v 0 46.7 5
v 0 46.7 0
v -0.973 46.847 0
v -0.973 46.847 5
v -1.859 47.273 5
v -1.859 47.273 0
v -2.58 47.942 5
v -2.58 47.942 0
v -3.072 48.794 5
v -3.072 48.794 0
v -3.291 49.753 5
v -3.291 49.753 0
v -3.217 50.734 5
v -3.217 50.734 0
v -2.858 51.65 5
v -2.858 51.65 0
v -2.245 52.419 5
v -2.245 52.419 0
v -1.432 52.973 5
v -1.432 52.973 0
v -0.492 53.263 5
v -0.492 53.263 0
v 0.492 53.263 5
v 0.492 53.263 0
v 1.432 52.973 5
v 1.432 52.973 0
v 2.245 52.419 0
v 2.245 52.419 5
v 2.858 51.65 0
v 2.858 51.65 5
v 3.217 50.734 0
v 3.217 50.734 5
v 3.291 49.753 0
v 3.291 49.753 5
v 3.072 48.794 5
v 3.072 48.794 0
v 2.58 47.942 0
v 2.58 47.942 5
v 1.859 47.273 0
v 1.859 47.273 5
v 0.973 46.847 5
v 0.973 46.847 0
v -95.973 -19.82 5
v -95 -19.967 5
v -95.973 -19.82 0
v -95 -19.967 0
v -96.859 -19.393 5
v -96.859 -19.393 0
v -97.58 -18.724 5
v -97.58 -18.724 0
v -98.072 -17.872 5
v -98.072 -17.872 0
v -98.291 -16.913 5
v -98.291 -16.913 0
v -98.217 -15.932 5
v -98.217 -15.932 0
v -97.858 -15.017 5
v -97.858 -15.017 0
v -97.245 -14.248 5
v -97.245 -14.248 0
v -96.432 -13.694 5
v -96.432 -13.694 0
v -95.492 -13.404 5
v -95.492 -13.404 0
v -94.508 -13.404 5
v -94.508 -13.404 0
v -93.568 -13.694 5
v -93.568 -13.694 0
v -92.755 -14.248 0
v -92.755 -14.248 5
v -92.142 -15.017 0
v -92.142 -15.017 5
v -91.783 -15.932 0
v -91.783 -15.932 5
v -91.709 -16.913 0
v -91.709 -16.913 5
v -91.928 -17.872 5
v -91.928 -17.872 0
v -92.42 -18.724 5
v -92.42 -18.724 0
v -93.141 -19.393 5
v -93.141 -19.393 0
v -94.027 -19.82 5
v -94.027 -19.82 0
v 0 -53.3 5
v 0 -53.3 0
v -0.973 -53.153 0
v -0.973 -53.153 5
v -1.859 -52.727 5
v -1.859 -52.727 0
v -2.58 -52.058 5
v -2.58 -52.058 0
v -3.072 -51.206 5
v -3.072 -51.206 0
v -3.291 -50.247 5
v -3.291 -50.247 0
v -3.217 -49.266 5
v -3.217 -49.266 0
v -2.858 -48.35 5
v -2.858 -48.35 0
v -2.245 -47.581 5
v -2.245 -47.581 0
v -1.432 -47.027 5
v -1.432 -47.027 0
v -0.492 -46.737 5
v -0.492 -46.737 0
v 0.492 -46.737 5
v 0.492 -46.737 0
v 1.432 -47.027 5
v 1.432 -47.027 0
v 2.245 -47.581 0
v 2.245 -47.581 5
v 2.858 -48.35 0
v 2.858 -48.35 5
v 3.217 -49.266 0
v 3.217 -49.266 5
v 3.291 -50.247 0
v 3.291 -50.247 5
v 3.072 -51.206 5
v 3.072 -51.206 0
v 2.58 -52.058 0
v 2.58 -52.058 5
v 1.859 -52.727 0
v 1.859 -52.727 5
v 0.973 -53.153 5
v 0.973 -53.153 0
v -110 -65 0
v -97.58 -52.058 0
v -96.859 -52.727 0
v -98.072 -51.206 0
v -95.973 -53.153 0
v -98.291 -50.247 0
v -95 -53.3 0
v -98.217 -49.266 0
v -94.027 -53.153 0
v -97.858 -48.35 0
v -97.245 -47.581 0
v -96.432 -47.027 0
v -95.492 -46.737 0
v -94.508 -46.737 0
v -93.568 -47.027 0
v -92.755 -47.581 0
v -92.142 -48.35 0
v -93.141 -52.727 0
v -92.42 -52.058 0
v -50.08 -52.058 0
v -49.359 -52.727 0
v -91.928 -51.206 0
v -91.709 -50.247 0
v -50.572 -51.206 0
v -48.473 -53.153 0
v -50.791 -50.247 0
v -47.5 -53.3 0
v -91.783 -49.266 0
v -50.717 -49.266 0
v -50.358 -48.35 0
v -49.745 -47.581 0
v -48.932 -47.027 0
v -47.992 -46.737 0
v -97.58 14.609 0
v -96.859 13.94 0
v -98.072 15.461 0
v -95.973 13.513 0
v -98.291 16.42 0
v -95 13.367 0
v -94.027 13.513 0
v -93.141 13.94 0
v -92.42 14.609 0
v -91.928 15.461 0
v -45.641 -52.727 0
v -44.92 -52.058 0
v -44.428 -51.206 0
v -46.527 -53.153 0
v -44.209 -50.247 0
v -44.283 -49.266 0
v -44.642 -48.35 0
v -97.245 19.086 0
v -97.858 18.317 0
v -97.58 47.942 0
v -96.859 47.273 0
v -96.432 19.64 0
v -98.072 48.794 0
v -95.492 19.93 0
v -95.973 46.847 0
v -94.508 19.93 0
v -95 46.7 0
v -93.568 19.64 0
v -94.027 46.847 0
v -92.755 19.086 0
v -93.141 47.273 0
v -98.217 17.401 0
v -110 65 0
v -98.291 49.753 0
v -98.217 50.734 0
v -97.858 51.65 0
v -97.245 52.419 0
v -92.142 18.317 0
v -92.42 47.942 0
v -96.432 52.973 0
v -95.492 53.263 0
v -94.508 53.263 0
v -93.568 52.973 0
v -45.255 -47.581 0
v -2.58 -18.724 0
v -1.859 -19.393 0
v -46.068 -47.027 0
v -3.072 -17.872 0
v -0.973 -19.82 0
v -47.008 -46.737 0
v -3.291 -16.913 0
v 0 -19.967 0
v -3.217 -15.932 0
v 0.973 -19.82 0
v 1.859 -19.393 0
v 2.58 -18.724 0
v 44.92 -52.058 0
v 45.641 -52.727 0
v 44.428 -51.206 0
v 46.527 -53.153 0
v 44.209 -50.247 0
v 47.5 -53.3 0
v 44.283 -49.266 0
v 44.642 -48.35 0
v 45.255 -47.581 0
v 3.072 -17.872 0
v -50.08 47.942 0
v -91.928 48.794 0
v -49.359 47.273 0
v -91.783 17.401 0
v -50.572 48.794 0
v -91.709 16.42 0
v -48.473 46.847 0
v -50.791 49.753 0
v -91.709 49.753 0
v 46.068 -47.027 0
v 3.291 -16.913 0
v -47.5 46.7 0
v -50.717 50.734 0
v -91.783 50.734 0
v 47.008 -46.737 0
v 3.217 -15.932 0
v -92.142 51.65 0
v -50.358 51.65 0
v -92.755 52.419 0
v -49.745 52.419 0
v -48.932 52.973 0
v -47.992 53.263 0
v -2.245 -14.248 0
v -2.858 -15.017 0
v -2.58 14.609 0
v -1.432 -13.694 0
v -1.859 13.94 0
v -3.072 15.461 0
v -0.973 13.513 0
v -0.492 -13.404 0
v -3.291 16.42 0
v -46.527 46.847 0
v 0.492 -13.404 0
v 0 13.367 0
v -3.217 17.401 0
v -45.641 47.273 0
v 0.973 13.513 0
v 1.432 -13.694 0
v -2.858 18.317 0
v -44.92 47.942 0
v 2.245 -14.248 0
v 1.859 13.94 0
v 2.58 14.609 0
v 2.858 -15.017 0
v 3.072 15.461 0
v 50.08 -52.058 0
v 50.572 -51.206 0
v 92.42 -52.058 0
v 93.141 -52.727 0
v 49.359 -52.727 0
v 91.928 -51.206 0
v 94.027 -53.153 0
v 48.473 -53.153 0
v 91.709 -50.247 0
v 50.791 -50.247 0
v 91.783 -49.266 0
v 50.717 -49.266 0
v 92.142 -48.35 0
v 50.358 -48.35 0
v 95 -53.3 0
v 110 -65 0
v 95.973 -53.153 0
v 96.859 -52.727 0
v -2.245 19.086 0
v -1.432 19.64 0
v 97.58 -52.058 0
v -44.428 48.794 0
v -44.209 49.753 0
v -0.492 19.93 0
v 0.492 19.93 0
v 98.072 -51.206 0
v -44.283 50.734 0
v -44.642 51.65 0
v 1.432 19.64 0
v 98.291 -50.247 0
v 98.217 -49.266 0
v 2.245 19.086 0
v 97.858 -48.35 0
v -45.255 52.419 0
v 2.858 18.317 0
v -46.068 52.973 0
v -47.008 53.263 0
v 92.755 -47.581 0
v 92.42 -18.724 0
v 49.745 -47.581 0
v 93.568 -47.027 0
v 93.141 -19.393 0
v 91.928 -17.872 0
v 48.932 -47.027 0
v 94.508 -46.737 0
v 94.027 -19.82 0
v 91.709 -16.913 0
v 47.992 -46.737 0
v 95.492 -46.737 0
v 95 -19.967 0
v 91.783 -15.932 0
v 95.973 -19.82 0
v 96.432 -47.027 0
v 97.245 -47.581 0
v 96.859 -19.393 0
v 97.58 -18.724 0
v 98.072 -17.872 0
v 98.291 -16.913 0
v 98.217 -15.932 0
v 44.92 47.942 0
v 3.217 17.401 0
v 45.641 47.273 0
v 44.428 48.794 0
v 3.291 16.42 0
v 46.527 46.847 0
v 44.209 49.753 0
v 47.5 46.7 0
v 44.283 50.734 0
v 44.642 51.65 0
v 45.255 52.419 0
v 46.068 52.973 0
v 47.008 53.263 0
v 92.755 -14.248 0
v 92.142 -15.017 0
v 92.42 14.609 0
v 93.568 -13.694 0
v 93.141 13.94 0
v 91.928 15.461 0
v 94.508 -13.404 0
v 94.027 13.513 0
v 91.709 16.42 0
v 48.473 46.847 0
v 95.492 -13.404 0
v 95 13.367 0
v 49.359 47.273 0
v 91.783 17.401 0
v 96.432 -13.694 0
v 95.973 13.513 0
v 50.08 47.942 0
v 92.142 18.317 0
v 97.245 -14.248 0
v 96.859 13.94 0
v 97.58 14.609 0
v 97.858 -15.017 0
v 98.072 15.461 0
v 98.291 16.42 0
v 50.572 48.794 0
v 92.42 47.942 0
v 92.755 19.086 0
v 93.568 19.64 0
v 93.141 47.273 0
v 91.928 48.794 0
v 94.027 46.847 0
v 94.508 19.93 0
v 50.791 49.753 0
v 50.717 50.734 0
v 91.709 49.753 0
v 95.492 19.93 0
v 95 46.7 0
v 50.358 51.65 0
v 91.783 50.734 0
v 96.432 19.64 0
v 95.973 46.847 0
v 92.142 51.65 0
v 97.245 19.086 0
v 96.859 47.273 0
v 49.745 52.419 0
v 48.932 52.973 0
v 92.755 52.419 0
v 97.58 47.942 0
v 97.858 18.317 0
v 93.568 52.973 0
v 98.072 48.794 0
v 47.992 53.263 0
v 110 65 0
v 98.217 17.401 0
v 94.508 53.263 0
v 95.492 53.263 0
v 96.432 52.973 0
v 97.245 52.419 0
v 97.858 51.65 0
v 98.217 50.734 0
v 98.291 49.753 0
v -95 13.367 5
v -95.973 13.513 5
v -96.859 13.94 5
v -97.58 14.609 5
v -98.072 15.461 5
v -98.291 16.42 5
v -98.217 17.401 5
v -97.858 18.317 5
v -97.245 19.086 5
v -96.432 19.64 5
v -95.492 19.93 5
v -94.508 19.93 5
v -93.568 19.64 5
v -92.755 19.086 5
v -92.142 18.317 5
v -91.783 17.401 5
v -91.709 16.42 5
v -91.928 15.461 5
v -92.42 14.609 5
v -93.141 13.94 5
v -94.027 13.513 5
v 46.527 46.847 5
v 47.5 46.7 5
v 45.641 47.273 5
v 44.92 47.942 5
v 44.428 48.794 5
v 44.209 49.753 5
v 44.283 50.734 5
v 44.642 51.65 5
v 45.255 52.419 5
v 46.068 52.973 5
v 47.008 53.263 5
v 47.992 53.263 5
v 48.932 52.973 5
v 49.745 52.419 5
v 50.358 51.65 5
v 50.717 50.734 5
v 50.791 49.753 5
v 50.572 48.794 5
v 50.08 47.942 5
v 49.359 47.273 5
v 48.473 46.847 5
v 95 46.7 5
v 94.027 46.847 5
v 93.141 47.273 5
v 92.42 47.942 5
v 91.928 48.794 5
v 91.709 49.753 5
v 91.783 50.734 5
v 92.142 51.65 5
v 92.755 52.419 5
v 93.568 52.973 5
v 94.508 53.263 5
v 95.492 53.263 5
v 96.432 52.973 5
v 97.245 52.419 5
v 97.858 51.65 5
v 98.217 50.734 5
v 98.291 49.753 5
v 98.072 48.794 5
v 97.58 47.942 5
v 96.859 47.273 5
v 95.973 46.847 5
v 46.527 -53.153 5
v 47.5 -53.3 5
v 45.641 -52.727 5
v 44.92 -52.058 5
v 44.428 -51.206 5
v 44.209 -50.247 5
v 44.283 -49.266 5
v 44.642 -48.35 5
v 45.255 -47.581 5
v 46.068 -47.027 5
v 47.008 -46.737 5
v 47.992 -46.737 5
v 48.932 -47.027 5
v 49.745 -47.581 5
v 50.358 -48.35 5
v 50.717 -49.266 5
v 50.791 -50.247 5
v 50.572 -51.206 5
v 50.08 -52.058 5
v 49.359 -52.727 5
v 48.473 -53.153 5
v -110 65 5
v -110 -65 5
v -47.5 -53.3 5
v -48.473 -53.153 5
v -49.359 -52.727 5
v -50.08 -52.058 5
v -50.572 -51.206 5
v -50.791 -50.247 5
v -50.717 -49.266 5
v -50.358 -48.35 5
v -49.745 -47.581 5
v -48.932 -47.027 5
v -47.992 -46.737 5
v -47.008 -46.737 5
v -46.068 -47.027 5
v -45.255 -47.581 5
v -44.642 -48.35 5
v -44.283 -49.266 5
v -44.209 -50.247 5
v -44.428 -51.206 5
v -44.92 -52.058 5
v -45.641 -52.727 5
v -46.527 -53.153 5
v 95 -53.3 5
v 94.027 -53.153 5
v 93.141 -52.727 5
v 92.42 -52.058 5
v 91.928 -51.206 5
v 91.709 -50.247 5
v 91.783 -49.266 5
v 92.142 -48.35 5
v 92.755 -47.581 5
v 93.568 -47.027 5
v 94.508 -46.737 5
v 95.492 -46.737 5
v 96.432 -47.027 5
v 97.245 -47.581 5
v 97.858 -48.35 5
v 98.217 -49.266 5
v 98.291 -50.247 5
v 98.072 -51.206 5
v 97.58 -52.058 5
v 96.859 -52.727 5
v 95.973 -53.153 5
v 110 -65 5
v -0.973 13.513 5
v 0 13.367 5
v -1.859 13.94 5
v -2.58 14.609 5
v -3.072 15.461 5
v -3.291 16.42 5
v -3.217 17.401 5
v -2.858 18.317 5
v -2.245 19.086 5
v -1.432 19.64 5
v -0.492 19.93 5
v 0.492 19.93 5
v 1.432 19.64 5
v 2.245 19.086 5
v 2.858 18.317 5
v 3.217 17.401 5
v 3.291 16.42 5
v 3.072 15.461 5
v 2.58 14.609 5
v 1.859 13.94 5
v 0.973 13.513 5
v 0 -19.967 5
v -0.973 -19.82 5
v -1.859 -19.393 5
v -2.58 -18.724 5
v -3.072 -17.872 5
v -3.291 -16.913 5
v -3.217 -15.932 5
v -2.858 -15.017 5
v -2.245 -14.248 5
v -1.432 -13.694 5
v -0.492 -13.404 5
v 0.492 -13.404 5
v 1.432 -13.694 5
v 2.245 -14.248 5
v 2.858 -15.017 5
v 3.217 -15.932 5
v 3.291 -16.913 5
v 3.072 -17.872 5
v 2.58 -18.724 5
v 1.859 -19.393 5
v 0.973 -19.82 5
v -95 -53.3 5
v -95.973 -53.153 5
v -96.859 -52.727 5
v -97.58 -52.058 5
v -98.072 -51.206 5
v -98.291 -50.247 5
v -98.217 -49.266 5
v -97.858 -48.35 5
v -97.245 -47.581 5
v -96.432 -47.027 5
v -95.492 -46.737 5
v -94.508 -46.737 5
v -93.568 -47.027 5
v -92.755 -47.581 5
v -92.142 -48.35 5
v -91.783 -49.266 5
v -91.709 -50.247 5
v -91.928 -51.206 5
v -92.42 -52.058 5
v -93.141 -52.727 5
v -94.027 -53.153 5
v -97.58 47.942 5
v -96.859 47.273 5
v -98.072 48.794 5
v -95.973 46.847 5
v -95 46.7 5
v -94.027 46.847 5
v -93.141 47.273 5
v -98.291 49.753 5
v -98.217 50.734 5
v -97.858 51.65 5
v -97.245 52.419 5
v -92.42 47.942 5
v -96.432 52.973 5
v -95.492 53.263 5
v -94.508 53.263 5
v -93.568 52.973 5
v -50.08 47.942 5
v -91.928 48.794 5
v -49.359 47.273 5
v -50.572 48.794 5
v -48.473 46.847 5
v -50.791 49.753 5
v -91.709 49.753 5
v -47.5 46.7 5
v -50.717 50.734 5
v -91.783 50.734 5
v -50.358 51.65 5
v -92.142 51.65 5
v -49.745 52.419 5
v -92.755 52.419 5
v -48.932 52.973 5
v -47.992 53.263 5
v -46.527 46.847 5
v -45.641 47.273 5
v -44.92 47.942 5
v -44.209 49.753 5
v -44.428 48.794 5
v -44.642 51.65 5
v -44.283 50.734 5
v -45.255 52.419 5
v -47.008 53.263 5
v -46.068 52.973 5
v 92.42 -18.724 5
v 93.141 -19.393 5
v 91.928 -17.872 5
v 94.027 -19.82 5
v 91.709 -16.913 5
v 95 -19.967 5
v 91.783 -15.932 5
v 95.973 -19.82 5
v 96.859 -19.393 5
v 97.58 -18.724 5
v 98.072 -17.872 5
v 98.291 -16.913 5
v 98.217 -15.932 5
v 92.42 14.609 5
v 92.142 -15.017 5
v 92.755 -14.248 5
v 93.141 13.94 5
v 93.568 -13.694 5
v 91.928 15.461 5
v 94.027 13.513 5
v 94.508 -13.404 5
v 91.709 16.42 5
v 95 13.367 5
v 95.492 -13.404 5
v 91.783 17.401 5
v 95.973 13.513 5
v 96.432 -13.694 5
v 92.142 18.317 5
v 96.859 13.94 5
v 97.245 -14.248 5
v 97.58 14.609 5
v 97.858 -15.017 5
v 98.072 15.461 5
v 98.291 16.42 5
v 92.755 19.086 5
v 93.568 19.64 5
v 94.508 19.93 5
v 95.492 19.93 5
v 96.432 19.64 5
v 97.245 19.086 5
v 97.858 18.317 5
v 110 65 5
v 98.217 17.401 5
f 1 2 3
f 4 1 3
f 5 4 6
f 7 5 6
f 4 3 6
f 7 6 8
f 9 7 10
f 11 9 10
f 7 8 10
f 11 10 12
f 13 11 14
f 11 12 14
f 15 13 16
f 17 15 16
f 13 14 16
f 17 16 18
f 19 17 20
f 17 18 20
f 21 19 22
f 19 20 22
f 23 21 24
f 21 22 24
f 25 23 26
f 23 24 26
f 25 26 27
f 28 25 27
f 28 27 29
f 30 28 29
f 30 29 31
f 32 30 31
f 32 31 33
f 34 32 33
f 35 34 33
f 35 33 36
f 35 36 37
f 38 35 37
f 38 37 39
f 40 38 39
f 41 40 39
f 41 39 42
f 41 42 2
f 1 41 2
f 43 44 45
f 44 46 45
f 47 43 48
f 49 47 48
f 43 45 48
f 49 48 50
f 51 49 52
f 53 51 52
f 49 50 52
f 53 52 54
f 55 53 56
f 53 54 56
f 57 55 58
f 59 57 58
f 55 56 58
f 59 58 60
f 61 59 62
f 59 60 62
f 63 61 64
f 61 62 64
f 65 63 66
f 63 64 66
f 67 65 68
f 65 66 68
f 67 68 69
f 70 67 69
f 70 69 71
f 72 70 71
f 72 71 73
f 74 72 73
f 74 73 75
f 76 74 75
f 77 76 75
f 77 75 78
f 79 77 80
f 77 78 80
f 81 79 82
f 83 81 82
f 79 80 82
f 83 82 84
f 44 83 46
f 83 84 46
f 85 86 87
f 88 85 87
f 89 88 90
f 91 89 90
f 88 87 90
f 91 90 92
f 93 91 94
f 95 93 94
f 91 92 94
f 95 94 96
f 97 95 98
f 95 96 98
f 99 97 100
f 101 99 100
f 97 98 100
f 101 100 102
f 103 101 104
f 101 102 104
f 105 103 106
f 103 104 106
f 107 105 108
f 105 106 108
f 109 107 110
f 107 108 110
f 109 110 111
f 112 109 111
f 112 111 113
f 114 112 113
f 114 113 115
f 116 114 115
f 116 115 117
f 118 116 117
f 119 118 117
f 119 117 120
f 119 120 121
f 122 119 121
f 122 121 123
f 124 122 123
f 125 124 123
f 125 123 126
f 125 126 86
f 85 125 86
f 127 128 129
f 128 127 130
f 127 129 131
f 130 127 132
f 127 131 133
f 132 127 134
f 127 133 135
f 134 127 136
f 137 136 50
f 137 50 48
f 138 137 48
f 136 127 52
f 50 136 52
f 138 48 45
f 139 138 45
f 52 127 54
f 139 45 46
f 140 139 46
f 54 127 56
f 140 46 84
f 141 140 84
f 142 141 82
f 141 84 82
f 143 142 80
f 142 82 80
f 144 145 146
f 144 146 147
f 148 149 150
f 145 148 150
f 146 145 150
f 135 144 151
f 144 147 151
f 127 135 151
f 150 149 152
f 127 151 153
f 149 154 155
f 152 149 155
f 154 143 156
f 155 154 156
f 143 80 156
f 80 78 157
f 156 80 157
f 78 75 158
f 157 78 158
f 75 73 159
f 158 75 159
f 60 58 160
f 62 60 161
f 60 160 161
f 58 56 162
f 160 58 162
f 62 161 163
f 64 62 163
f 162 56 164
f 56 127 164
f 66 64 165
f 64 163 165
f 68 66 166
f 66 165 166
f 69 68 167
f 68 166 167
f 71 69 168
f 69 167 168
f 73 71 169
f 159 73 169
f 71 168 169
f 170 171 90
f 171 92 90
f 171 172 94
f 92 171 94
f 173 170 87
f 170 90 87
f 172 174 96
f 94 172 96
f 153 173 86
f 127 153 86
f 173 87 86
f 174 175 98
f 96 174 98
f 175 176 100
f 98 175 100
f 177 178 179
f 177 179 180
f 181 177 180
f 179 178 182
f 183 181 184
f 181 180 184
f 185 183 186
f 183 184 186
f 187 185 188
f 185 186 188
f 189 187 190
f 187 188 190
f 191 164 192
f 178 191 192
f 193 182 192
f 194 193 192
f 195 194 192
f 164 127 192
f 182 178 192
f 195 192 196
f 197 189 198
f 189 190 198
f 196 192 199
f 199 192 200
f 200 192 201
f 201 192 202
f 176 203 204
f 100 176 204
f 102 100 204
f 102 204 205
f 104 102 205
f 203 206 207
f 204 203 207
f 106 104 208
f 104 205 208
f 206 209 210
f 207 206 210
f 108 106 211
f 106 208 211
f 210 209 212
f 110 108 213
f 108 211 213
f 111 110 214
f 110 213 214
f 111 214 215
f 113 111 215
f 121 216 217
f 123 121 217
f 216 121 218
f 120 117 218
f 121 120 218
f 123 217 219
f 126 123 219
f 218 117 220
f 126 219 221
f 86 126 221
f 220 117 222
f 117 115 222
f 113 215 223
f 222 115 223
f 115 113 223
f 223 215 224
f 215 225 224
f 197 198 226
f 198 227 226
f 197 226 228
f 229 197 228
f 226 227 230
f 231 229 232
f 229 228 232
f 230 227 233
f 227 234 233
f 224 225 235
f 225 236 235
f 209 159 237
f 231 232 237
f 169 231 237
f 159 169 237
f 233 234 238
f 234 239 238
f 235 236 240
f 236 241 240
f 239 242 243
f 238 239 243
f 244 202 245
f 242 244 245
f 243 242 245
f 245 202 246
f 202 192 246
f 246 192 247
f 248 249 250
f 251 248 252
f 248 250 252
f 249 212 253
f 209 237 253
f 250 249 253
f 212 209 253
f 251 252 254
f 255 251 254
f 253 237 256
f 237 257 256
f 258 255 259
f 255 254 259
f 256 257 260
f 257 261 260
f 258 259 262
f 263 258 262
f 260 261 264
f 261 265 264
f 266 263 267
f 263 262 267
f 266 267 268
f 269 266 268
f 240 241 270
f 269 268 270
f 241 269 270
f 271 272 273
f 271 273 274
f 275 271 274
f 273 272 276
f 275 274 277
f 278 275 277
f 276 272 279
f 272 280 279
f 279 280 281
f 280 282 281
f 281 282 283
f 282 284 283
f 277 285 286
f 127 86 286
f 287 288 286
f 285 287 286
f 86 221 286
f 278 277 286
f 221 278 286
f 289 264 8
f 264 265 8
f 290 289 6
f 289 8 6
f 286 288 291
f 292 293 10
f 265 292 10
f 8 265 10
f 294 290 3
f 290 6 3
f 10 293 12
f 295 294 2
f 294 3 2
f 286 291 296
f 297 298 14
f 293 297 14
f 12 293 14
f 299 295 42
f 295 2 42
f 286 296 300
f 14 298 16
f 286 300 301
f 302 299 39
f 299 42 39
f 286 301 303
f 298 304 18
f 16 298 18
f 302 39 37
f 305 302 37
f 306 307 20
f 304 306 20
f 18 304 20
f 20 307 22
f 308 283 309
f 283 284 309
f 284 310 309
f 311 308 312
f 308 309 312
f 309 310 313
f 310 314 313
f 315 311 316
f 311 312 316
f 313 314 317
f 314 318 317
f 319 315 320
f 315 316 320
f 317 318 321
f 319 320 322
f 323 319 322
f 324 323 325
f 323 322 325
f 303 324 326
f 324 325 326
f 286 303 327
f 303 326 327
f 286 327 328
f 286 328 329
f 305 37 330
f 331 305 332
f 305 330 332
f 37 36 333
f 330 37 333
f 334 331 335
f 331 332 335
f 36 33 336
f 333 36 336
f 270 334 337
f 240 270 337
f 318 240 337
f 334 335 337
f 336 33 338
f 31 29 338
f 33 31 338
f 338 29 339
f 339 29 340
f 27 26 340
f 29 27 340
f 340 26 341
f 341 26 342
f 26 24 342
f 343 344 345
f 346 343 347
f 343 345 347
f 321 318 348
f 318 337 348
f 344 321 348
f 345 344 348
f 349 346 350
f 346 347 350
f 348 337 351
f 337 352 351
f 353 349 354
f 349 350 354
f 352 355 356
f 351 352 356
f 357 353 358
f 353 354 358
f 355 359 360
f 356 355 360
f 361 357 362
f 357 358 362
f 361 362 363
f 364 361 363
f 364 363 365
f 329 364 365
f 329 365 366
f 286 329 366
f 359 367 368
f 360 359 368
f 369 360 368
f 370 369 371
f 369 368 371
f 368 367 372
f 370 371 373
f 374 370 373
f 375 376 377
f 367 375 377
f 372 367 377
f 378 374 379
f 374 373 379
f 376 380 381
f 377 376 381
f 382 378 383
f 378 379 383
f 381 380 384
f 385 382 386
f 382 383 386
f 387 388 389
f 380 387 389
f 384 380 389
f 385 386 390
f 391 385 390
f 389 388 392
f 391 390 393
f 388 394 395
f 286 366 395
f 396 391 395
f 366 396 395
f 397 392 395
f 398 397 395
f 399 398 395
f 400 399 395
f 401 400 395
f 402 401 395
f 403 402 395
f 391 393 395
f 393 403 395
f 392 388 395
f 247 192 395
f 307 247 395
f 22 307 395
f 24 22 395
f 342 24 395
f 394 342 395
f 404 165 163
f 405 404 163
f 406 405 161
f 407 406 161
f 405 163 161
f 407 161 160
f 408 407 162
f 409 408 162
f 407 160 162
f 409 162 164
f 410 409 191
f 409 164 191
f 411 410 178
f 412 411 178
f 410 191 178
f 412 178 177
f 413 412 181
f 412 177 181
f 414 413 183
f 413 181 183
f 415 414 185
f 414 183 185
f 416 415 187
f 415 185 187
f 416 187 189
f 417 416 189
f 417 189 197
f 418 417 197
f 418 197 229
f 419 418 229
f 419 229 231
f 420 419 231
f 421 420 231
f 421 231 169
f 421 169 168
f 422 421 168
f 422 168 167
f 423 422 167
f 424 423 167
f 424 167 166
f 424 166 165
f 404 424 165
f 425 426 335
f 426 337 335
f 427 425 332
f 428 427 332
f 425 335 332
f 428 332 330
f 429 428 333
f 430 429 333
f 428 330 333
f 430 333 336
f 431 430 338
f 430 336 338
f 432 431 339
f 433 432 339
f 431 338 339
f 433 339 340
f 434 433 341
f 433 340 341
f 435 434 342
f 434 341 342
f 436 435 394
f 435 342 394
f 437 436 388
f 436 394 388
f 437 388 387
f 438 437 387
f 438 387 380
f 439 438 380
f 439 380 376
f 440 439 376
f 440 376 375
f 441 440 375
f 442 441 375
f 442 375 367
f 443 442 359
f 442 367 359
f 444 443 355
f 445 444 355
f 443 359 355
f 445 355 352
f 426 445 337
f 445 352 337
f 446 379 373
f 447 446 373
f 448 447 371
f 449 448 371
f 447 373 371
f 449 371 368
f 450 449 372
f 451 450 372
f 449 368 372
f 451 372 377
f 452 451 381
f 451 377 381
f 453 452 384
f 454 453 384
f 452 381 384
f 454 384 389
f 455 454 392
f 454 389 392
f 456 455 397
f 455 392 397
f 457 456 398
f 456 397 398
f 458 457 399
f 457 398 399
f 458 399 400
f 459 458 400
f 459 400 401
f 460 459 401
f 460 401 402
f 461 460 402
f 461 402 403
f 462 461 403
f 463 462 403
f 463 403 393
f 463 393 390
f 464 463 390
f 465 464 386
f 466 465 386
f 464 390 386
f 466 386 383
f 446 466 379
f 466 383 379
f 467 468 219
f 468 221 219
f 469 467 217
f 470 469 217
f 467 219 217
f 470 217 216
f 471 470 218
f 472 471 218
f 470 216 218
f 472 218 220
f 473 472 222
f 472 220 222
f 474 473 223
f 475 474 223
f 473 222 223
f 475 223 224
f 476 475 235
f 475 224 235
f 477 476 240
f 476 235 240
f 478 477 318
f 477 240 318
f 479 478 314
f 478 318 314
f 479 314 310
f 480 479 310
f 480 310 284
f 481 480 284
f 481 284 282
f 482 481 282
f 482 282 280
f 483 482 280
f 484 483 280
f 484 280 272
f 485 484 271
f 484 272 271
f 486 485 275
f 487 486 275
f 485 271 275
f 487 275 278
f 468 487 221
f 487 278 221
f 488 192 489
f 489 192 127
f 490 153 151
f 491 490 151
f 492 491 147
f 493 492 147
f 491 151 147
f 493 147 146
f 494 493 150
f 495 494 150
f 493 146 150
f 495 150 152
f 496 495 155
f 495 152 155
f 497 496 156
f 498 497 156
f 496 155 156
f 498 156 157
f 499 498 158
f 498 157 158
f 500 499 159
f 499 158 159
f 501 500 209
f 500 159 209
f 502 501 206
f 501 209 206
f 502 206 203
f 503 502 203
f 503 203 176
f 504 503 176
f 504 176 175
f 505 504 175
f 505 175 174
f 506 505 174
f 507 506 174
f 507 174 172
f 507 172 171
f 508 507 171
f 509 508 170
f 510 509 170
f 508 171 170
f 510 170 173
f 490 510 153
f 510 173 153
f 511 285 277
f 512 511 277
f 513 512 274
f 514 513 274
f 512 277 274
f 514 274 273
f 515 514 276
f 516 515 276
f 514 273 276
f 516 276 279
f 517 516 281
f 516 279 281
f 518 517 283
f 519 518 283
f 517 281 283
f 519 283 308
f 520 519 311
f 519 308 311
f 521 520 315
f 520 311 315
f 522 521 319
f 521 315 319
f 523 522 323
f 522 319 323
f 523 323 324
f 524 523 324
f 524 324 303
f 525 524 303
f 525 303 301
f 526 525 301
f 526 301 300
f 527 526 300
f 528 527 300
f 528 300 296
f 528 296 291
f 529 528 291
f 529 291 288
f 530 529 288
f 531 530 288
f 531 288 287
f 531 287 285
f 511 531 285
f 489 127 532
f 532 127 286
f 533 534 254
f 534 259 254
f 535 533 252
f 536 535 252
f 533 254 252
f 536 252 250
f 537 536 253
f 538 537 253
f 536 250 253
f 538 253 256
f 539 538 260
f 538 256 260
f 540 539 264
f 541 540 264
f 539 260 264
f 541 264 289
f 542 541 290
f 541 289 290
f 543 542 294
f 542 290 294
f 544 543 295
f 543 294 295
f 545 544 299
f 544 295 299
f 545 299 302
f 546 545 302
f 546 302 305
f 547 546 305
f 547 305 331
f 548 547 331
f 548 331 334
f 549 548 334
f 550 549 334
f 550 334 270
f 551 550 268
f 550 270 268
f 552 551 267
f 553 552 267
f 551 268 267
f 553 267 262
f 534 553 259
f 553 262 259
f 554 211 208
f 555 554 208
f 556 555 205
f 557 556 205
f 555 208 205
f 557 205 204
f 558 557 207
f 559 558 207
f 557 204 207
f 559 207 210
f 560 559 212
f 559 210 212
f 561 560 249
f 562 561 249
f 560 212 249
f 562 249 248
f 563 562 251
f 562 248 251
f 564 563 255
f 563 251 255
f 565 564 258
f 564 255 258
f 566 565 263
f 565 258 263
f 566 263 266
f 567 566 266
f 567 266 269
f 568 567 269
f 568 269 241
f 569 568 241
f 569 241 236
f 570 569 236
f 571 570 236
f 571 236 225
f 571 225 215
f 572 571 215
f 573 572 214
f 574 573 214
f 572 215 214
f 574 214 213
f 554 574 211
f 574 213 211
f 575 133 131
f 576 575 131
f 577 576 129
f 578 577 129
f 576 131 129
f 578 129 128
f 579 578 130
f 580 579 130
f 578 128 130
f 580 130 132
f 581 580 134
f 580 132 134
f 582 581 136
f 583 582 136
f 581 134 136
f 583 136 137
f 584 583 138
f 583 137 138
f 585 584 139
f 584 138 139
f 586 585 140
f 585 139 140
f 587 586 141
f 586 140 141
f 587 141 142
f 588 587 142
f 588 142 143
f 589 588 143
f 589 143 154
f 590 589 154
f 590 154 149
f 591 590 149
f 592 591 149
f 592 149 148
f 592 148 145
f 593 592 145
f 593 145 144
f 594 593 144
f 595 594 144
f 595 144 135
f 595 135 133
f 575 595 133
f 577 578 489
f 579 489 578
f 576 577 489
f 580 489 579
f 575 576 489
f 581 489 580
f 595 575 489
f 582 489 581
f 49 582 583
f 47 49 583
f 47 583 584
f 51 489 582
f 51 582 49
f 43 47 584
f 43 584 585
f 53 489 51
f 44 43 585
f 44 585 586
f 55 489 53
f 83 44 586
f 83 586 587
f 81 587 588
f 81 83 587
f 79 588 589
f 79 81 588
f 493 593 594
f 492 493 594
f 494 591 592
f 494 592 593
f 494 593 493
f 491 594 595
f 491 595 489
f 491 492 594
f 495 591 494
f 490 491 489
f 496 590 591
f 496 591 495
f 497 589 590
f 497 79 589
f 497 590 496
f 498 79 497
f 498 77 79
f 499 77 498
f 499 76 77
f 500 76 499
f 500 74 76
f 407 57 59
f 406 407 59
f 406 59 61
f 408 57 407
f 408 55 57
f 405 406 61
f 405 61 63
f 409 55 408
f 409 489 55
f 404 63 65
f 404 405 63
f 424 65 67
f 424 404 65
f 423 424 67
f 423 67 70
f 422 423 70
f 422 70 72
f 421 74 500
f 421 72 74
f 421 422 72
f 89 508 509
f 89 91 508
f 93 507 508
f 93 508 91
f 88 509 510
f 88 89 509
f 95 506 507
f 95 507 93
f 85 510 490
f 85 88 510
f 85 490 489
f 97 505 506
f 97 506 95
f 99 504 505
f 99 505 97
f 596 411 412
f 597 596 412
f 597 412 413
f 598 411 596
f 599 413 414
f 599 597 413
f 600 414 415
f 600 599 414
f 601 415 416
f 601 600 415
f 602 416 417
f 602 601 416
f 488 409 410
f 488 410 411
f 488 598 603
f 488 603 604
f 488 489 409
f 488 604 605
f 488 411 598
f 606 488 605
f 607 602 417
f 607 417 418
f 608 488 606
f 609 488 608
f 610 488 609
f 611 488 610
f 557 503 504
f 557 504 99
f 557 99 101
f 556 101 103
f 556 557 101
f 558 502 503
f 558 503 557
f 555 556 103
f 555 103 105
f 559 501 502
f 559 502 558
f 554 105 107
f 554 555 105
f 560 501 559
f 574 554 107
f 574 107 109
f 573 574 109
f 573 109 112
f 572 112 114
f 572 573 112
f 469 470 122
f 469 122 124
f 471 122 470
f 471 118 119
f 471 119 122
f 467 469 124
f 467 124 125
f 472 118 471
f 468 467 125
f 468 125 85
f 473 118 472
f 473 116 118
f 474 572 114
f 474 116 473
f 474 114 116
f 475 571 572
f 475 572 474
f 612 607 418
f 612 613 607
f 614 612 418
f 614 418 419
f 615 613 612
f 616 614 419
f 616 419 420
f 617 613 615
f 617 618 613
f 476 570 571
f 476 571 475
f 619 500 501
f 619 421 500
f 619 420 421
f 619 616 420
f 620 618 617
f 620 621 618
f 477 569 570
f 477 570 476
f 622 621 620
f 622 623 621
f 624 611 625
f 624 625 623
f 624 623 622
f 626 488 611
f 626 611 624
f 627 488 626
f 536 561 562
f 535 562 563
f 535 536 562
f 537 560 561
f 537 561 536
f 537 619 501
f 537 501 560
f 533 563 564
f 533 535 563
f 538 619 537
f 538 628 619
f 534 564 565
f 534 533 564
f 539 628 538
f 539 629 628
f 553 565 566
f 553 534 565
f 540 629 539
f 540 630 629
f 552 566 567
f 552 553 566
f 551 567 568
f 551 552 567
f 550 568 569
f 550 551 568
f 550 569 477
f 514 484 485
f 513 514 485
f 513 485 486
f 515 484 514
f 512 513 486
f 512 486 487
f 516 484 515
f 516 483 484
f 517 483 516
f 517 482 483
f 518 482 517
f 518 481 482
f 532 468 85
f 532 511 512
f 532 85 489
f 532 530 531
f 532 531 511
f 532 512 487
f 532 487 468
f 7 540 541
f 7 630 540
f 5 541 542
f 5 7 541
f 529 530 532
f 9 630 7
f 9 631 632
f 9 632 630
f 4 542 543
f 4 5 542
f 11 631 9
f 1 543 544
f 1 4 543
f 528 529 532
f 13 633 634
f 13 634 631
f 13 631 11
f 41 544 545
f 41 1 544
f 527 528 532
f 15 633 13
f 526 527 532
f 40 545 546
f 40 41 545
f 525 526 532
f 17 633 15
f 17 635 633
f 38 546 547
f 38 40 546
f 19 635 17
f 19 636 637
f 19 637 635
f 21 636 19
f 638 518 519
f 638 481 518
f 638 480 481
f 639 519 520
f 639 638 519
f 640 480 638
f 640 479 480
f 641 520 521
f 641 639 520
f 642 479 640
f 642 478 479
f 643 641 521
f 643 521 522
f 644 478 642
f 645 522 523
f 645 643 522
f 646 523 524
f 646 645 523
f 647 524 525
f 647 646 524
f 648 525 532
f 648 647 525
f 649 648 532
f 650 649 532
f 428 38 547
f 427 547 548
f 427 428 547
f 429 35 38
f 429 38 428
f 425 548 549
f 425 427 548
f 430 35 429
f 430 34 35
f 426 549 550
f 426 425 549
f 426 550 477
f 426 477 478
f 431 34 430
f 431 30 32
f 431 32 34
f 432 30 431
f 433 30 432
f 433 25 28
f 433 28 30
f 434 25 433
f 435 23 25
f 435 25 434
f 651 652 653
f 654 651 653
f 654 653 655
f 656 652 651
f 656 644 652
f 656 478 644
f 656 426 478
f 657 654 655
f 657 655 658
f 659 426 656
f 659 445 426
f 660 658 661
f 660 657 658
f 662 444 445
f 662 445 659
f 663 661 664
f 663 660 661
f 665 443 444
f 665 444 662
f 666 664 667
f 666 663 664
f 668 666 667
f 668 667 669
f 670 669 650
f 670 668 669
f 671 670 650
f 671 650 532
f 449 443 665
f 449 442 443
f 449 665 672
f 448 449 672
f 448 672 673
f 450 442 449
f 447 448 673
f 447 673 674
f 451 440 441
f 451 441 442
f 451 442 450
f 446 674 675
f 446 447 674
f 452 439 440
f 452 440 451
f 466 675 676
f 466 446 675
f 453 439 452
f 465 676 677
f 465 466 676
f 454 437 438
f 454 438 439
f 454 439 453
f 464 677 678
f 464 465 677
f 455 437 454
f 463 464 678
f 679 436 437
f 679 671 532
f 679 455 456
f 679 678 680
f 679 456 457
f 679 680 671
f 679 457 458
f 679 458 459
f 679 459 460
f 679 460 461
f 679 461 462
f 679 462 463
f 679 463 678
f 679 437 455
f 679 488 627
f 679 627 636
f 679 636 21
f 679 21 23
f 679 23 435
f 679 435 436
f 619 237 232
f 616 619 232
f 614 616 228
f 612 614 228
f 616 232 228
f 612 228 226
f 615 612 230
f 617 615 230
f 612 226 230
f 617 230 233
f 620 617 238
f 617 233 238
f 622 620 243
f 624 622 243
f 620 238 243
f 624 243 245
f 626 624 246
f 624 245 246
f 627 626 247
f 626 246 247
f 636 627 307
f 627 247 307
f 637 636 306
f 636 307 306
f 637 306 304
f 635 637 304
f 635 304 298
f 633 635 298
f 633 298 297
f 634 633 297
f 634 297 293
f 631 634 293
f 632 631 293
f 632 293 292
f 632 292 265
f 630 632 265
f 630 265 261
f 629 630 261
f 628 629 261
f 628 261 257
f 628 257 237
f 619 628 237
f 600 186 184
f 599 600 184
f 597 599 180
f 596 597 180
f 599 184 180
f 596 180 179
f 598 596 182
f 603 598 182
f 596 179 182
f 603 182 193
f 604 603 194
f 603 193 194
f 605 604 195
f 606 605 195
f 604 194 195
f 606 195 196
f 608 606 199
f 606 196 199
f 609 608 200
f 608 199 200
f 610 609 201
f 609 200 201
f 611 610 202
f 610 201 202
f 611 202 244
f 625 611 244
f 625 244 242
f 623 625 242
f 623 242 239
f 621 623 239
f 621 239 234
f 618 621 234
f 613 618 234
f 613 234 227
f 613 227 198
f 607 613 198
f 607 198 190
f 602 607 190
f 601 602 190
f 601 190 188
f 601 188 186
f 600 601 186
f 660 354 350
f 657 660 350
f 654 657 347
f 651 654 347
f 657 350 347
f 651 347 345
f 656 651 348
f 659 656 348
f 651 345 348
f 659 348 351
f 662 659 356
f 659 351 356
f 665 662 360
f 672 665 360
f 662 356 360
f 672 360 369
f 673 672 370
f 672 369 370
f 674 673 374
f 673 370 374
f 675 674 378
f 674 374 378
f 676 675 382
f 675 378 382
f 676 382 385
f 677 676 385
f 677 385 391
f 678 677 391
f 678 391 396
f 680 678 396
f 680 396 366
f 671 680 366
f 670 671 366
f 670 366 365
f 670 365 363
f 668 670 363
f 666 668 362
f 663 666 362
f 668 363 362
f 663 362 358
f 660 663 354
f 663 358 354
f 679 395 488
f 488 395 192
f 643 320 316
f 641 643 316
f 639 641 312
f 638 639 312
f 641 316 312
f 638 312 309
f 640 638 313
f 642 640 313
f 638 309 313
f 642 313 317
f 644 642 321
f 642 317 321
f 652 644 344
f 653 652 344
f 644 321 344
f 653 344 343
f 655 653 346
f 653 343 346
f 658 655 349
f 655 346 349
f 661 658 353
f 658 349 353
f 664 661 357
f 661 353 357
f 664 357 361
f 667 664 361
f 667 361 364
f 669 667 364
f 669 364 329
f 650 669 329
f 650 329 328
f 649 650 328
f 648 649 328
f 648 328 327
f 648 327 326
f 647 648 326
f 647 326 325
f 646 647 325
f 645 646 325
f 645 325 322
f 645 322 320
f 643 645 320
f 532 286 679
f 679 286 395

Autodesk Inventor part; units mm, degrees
ref_plane "YZ Plane" through (0, 0, 0) normal (1, 0, 0) x (0, 1, 0)
ref_plane "XZ Plane" through (0, 0, 0) normal (0, 1, 0) x (-1, 0, 0)
ref_plane "XY Plane" through (0, 0, 0) normal (0, 0, 1) x (1, 0, 0)
sketch "Skizze1" plane through (0, 0, 0) normal (0, 0, 1) x (1, 0, 0)
  line L0 (-110, -65) -> (110, -65)
  line L1 (110, -65) -> (110, 65)
  line L2 (110, 65) -> (-110, 65)
  line L3 (-110, 65) -> (-110, -65)
  line L4 (-110, -65) -> (110, 65) construction
  line L5 (110, -65) -> (-110, 65) construction
  point P0 (0, 0)
  dimension "d0" = 220
  dimension "d1" = 130
extrude "Grundkörper" add sketch "Skizze1" along normal blind 5
sketch "Skizze2" plane through (0, 0, 5) normal (0, 0, 1) x (1, 0, 0)
  line L0 (110, 65) -> (-110, 65) construction
  line L1 (-110, 65) -> (-110, -65) construction
  line L2 (110, -65) -> (110, 65) construction
  line L3 (-110, -65) -> (110, -65) construction
  line L4 (-95, -50) -> (95, -50) construction
  line L5 (95, -50) -> (95, 50) construction
  line L6 (95, 50) -> (-95, 50) construction
  line L7 (-95, 50) -> (-95, -50) construction
  line L8 (-95, -50) -> (95, 50) construction
  line L9 (95, -50) -> (-95, 50) construction
  line L10 (0, 65) -> (0, -65) construction
  point P0 (0, 0)
  point P1 (0, 50)
  point P2 (-95, 16.6667)
  point P3 (-95, -16.6667)
  point P4 (-95, -50)
  point P5 (0, 50)
  point P6 (0, 16.6667)
  point P7 (0, -16.6667)
  point P8 (0, -50)
  point P9 (-47.5, 50)
  point P10 (-47.5, -50)
  point P11 (0, 50)
  point P12 (0, -50)
  point P13 (95, 50)
  point P14 (95, 16.6667)
  point P15 (95, -16.6667)
  point P16 (95, -50)
  point P17 (95, -50)
  point P18 (47.5, 50)
  point P19 (47.5, -50)
  dimension "d4" = 15
  dimension "d5" = 15
  dimension "d6" = 100
  dimension "d7" = 190
  dimension "d17" = 33.3333
  dimension "d20" = 95
  dimension "d25" = 47.5
hole "Boh_M6" at (-95, 50, 5) at (0, 50, 5) at (-95, 16.6667, 5) at (-95, -16.6667, 5) at (-95, -50, 5) at (-95, -50, 5) at (0, 16.6667, 5) at (0, -16.6667, 5) at (0, -50, 5) at (-47.5, 50, 5) at (-47.5, -50, 5) at (47.5, 50, 5) at (95, 50, 5) at (95, 16.6667, 5) at (95, -16.6667, 5) at (95, -50, 5) at (95, -50, 5) at (47.5, -50, 5) direction (0, 0, -1) diameter 6.6 end through all
equation "\"d0\" = Chassis_Width"
equation "\"d17\" = 0.333333 * d6"
equation "\"d20\" = 0.5 * d7"
equation "\"d25\" = 0.25 * d7"
equation "\"Chassis_Width\" = 220"
equation "\"Rocker_Screw_Distance\" = 32.5"
equation "\"Rocker_Screw_Distance_Bottom\" = 76"
properties part number "100-10-FRAME-DIFFERENTIAL-REINF-01" material "Aluminium 6061"
